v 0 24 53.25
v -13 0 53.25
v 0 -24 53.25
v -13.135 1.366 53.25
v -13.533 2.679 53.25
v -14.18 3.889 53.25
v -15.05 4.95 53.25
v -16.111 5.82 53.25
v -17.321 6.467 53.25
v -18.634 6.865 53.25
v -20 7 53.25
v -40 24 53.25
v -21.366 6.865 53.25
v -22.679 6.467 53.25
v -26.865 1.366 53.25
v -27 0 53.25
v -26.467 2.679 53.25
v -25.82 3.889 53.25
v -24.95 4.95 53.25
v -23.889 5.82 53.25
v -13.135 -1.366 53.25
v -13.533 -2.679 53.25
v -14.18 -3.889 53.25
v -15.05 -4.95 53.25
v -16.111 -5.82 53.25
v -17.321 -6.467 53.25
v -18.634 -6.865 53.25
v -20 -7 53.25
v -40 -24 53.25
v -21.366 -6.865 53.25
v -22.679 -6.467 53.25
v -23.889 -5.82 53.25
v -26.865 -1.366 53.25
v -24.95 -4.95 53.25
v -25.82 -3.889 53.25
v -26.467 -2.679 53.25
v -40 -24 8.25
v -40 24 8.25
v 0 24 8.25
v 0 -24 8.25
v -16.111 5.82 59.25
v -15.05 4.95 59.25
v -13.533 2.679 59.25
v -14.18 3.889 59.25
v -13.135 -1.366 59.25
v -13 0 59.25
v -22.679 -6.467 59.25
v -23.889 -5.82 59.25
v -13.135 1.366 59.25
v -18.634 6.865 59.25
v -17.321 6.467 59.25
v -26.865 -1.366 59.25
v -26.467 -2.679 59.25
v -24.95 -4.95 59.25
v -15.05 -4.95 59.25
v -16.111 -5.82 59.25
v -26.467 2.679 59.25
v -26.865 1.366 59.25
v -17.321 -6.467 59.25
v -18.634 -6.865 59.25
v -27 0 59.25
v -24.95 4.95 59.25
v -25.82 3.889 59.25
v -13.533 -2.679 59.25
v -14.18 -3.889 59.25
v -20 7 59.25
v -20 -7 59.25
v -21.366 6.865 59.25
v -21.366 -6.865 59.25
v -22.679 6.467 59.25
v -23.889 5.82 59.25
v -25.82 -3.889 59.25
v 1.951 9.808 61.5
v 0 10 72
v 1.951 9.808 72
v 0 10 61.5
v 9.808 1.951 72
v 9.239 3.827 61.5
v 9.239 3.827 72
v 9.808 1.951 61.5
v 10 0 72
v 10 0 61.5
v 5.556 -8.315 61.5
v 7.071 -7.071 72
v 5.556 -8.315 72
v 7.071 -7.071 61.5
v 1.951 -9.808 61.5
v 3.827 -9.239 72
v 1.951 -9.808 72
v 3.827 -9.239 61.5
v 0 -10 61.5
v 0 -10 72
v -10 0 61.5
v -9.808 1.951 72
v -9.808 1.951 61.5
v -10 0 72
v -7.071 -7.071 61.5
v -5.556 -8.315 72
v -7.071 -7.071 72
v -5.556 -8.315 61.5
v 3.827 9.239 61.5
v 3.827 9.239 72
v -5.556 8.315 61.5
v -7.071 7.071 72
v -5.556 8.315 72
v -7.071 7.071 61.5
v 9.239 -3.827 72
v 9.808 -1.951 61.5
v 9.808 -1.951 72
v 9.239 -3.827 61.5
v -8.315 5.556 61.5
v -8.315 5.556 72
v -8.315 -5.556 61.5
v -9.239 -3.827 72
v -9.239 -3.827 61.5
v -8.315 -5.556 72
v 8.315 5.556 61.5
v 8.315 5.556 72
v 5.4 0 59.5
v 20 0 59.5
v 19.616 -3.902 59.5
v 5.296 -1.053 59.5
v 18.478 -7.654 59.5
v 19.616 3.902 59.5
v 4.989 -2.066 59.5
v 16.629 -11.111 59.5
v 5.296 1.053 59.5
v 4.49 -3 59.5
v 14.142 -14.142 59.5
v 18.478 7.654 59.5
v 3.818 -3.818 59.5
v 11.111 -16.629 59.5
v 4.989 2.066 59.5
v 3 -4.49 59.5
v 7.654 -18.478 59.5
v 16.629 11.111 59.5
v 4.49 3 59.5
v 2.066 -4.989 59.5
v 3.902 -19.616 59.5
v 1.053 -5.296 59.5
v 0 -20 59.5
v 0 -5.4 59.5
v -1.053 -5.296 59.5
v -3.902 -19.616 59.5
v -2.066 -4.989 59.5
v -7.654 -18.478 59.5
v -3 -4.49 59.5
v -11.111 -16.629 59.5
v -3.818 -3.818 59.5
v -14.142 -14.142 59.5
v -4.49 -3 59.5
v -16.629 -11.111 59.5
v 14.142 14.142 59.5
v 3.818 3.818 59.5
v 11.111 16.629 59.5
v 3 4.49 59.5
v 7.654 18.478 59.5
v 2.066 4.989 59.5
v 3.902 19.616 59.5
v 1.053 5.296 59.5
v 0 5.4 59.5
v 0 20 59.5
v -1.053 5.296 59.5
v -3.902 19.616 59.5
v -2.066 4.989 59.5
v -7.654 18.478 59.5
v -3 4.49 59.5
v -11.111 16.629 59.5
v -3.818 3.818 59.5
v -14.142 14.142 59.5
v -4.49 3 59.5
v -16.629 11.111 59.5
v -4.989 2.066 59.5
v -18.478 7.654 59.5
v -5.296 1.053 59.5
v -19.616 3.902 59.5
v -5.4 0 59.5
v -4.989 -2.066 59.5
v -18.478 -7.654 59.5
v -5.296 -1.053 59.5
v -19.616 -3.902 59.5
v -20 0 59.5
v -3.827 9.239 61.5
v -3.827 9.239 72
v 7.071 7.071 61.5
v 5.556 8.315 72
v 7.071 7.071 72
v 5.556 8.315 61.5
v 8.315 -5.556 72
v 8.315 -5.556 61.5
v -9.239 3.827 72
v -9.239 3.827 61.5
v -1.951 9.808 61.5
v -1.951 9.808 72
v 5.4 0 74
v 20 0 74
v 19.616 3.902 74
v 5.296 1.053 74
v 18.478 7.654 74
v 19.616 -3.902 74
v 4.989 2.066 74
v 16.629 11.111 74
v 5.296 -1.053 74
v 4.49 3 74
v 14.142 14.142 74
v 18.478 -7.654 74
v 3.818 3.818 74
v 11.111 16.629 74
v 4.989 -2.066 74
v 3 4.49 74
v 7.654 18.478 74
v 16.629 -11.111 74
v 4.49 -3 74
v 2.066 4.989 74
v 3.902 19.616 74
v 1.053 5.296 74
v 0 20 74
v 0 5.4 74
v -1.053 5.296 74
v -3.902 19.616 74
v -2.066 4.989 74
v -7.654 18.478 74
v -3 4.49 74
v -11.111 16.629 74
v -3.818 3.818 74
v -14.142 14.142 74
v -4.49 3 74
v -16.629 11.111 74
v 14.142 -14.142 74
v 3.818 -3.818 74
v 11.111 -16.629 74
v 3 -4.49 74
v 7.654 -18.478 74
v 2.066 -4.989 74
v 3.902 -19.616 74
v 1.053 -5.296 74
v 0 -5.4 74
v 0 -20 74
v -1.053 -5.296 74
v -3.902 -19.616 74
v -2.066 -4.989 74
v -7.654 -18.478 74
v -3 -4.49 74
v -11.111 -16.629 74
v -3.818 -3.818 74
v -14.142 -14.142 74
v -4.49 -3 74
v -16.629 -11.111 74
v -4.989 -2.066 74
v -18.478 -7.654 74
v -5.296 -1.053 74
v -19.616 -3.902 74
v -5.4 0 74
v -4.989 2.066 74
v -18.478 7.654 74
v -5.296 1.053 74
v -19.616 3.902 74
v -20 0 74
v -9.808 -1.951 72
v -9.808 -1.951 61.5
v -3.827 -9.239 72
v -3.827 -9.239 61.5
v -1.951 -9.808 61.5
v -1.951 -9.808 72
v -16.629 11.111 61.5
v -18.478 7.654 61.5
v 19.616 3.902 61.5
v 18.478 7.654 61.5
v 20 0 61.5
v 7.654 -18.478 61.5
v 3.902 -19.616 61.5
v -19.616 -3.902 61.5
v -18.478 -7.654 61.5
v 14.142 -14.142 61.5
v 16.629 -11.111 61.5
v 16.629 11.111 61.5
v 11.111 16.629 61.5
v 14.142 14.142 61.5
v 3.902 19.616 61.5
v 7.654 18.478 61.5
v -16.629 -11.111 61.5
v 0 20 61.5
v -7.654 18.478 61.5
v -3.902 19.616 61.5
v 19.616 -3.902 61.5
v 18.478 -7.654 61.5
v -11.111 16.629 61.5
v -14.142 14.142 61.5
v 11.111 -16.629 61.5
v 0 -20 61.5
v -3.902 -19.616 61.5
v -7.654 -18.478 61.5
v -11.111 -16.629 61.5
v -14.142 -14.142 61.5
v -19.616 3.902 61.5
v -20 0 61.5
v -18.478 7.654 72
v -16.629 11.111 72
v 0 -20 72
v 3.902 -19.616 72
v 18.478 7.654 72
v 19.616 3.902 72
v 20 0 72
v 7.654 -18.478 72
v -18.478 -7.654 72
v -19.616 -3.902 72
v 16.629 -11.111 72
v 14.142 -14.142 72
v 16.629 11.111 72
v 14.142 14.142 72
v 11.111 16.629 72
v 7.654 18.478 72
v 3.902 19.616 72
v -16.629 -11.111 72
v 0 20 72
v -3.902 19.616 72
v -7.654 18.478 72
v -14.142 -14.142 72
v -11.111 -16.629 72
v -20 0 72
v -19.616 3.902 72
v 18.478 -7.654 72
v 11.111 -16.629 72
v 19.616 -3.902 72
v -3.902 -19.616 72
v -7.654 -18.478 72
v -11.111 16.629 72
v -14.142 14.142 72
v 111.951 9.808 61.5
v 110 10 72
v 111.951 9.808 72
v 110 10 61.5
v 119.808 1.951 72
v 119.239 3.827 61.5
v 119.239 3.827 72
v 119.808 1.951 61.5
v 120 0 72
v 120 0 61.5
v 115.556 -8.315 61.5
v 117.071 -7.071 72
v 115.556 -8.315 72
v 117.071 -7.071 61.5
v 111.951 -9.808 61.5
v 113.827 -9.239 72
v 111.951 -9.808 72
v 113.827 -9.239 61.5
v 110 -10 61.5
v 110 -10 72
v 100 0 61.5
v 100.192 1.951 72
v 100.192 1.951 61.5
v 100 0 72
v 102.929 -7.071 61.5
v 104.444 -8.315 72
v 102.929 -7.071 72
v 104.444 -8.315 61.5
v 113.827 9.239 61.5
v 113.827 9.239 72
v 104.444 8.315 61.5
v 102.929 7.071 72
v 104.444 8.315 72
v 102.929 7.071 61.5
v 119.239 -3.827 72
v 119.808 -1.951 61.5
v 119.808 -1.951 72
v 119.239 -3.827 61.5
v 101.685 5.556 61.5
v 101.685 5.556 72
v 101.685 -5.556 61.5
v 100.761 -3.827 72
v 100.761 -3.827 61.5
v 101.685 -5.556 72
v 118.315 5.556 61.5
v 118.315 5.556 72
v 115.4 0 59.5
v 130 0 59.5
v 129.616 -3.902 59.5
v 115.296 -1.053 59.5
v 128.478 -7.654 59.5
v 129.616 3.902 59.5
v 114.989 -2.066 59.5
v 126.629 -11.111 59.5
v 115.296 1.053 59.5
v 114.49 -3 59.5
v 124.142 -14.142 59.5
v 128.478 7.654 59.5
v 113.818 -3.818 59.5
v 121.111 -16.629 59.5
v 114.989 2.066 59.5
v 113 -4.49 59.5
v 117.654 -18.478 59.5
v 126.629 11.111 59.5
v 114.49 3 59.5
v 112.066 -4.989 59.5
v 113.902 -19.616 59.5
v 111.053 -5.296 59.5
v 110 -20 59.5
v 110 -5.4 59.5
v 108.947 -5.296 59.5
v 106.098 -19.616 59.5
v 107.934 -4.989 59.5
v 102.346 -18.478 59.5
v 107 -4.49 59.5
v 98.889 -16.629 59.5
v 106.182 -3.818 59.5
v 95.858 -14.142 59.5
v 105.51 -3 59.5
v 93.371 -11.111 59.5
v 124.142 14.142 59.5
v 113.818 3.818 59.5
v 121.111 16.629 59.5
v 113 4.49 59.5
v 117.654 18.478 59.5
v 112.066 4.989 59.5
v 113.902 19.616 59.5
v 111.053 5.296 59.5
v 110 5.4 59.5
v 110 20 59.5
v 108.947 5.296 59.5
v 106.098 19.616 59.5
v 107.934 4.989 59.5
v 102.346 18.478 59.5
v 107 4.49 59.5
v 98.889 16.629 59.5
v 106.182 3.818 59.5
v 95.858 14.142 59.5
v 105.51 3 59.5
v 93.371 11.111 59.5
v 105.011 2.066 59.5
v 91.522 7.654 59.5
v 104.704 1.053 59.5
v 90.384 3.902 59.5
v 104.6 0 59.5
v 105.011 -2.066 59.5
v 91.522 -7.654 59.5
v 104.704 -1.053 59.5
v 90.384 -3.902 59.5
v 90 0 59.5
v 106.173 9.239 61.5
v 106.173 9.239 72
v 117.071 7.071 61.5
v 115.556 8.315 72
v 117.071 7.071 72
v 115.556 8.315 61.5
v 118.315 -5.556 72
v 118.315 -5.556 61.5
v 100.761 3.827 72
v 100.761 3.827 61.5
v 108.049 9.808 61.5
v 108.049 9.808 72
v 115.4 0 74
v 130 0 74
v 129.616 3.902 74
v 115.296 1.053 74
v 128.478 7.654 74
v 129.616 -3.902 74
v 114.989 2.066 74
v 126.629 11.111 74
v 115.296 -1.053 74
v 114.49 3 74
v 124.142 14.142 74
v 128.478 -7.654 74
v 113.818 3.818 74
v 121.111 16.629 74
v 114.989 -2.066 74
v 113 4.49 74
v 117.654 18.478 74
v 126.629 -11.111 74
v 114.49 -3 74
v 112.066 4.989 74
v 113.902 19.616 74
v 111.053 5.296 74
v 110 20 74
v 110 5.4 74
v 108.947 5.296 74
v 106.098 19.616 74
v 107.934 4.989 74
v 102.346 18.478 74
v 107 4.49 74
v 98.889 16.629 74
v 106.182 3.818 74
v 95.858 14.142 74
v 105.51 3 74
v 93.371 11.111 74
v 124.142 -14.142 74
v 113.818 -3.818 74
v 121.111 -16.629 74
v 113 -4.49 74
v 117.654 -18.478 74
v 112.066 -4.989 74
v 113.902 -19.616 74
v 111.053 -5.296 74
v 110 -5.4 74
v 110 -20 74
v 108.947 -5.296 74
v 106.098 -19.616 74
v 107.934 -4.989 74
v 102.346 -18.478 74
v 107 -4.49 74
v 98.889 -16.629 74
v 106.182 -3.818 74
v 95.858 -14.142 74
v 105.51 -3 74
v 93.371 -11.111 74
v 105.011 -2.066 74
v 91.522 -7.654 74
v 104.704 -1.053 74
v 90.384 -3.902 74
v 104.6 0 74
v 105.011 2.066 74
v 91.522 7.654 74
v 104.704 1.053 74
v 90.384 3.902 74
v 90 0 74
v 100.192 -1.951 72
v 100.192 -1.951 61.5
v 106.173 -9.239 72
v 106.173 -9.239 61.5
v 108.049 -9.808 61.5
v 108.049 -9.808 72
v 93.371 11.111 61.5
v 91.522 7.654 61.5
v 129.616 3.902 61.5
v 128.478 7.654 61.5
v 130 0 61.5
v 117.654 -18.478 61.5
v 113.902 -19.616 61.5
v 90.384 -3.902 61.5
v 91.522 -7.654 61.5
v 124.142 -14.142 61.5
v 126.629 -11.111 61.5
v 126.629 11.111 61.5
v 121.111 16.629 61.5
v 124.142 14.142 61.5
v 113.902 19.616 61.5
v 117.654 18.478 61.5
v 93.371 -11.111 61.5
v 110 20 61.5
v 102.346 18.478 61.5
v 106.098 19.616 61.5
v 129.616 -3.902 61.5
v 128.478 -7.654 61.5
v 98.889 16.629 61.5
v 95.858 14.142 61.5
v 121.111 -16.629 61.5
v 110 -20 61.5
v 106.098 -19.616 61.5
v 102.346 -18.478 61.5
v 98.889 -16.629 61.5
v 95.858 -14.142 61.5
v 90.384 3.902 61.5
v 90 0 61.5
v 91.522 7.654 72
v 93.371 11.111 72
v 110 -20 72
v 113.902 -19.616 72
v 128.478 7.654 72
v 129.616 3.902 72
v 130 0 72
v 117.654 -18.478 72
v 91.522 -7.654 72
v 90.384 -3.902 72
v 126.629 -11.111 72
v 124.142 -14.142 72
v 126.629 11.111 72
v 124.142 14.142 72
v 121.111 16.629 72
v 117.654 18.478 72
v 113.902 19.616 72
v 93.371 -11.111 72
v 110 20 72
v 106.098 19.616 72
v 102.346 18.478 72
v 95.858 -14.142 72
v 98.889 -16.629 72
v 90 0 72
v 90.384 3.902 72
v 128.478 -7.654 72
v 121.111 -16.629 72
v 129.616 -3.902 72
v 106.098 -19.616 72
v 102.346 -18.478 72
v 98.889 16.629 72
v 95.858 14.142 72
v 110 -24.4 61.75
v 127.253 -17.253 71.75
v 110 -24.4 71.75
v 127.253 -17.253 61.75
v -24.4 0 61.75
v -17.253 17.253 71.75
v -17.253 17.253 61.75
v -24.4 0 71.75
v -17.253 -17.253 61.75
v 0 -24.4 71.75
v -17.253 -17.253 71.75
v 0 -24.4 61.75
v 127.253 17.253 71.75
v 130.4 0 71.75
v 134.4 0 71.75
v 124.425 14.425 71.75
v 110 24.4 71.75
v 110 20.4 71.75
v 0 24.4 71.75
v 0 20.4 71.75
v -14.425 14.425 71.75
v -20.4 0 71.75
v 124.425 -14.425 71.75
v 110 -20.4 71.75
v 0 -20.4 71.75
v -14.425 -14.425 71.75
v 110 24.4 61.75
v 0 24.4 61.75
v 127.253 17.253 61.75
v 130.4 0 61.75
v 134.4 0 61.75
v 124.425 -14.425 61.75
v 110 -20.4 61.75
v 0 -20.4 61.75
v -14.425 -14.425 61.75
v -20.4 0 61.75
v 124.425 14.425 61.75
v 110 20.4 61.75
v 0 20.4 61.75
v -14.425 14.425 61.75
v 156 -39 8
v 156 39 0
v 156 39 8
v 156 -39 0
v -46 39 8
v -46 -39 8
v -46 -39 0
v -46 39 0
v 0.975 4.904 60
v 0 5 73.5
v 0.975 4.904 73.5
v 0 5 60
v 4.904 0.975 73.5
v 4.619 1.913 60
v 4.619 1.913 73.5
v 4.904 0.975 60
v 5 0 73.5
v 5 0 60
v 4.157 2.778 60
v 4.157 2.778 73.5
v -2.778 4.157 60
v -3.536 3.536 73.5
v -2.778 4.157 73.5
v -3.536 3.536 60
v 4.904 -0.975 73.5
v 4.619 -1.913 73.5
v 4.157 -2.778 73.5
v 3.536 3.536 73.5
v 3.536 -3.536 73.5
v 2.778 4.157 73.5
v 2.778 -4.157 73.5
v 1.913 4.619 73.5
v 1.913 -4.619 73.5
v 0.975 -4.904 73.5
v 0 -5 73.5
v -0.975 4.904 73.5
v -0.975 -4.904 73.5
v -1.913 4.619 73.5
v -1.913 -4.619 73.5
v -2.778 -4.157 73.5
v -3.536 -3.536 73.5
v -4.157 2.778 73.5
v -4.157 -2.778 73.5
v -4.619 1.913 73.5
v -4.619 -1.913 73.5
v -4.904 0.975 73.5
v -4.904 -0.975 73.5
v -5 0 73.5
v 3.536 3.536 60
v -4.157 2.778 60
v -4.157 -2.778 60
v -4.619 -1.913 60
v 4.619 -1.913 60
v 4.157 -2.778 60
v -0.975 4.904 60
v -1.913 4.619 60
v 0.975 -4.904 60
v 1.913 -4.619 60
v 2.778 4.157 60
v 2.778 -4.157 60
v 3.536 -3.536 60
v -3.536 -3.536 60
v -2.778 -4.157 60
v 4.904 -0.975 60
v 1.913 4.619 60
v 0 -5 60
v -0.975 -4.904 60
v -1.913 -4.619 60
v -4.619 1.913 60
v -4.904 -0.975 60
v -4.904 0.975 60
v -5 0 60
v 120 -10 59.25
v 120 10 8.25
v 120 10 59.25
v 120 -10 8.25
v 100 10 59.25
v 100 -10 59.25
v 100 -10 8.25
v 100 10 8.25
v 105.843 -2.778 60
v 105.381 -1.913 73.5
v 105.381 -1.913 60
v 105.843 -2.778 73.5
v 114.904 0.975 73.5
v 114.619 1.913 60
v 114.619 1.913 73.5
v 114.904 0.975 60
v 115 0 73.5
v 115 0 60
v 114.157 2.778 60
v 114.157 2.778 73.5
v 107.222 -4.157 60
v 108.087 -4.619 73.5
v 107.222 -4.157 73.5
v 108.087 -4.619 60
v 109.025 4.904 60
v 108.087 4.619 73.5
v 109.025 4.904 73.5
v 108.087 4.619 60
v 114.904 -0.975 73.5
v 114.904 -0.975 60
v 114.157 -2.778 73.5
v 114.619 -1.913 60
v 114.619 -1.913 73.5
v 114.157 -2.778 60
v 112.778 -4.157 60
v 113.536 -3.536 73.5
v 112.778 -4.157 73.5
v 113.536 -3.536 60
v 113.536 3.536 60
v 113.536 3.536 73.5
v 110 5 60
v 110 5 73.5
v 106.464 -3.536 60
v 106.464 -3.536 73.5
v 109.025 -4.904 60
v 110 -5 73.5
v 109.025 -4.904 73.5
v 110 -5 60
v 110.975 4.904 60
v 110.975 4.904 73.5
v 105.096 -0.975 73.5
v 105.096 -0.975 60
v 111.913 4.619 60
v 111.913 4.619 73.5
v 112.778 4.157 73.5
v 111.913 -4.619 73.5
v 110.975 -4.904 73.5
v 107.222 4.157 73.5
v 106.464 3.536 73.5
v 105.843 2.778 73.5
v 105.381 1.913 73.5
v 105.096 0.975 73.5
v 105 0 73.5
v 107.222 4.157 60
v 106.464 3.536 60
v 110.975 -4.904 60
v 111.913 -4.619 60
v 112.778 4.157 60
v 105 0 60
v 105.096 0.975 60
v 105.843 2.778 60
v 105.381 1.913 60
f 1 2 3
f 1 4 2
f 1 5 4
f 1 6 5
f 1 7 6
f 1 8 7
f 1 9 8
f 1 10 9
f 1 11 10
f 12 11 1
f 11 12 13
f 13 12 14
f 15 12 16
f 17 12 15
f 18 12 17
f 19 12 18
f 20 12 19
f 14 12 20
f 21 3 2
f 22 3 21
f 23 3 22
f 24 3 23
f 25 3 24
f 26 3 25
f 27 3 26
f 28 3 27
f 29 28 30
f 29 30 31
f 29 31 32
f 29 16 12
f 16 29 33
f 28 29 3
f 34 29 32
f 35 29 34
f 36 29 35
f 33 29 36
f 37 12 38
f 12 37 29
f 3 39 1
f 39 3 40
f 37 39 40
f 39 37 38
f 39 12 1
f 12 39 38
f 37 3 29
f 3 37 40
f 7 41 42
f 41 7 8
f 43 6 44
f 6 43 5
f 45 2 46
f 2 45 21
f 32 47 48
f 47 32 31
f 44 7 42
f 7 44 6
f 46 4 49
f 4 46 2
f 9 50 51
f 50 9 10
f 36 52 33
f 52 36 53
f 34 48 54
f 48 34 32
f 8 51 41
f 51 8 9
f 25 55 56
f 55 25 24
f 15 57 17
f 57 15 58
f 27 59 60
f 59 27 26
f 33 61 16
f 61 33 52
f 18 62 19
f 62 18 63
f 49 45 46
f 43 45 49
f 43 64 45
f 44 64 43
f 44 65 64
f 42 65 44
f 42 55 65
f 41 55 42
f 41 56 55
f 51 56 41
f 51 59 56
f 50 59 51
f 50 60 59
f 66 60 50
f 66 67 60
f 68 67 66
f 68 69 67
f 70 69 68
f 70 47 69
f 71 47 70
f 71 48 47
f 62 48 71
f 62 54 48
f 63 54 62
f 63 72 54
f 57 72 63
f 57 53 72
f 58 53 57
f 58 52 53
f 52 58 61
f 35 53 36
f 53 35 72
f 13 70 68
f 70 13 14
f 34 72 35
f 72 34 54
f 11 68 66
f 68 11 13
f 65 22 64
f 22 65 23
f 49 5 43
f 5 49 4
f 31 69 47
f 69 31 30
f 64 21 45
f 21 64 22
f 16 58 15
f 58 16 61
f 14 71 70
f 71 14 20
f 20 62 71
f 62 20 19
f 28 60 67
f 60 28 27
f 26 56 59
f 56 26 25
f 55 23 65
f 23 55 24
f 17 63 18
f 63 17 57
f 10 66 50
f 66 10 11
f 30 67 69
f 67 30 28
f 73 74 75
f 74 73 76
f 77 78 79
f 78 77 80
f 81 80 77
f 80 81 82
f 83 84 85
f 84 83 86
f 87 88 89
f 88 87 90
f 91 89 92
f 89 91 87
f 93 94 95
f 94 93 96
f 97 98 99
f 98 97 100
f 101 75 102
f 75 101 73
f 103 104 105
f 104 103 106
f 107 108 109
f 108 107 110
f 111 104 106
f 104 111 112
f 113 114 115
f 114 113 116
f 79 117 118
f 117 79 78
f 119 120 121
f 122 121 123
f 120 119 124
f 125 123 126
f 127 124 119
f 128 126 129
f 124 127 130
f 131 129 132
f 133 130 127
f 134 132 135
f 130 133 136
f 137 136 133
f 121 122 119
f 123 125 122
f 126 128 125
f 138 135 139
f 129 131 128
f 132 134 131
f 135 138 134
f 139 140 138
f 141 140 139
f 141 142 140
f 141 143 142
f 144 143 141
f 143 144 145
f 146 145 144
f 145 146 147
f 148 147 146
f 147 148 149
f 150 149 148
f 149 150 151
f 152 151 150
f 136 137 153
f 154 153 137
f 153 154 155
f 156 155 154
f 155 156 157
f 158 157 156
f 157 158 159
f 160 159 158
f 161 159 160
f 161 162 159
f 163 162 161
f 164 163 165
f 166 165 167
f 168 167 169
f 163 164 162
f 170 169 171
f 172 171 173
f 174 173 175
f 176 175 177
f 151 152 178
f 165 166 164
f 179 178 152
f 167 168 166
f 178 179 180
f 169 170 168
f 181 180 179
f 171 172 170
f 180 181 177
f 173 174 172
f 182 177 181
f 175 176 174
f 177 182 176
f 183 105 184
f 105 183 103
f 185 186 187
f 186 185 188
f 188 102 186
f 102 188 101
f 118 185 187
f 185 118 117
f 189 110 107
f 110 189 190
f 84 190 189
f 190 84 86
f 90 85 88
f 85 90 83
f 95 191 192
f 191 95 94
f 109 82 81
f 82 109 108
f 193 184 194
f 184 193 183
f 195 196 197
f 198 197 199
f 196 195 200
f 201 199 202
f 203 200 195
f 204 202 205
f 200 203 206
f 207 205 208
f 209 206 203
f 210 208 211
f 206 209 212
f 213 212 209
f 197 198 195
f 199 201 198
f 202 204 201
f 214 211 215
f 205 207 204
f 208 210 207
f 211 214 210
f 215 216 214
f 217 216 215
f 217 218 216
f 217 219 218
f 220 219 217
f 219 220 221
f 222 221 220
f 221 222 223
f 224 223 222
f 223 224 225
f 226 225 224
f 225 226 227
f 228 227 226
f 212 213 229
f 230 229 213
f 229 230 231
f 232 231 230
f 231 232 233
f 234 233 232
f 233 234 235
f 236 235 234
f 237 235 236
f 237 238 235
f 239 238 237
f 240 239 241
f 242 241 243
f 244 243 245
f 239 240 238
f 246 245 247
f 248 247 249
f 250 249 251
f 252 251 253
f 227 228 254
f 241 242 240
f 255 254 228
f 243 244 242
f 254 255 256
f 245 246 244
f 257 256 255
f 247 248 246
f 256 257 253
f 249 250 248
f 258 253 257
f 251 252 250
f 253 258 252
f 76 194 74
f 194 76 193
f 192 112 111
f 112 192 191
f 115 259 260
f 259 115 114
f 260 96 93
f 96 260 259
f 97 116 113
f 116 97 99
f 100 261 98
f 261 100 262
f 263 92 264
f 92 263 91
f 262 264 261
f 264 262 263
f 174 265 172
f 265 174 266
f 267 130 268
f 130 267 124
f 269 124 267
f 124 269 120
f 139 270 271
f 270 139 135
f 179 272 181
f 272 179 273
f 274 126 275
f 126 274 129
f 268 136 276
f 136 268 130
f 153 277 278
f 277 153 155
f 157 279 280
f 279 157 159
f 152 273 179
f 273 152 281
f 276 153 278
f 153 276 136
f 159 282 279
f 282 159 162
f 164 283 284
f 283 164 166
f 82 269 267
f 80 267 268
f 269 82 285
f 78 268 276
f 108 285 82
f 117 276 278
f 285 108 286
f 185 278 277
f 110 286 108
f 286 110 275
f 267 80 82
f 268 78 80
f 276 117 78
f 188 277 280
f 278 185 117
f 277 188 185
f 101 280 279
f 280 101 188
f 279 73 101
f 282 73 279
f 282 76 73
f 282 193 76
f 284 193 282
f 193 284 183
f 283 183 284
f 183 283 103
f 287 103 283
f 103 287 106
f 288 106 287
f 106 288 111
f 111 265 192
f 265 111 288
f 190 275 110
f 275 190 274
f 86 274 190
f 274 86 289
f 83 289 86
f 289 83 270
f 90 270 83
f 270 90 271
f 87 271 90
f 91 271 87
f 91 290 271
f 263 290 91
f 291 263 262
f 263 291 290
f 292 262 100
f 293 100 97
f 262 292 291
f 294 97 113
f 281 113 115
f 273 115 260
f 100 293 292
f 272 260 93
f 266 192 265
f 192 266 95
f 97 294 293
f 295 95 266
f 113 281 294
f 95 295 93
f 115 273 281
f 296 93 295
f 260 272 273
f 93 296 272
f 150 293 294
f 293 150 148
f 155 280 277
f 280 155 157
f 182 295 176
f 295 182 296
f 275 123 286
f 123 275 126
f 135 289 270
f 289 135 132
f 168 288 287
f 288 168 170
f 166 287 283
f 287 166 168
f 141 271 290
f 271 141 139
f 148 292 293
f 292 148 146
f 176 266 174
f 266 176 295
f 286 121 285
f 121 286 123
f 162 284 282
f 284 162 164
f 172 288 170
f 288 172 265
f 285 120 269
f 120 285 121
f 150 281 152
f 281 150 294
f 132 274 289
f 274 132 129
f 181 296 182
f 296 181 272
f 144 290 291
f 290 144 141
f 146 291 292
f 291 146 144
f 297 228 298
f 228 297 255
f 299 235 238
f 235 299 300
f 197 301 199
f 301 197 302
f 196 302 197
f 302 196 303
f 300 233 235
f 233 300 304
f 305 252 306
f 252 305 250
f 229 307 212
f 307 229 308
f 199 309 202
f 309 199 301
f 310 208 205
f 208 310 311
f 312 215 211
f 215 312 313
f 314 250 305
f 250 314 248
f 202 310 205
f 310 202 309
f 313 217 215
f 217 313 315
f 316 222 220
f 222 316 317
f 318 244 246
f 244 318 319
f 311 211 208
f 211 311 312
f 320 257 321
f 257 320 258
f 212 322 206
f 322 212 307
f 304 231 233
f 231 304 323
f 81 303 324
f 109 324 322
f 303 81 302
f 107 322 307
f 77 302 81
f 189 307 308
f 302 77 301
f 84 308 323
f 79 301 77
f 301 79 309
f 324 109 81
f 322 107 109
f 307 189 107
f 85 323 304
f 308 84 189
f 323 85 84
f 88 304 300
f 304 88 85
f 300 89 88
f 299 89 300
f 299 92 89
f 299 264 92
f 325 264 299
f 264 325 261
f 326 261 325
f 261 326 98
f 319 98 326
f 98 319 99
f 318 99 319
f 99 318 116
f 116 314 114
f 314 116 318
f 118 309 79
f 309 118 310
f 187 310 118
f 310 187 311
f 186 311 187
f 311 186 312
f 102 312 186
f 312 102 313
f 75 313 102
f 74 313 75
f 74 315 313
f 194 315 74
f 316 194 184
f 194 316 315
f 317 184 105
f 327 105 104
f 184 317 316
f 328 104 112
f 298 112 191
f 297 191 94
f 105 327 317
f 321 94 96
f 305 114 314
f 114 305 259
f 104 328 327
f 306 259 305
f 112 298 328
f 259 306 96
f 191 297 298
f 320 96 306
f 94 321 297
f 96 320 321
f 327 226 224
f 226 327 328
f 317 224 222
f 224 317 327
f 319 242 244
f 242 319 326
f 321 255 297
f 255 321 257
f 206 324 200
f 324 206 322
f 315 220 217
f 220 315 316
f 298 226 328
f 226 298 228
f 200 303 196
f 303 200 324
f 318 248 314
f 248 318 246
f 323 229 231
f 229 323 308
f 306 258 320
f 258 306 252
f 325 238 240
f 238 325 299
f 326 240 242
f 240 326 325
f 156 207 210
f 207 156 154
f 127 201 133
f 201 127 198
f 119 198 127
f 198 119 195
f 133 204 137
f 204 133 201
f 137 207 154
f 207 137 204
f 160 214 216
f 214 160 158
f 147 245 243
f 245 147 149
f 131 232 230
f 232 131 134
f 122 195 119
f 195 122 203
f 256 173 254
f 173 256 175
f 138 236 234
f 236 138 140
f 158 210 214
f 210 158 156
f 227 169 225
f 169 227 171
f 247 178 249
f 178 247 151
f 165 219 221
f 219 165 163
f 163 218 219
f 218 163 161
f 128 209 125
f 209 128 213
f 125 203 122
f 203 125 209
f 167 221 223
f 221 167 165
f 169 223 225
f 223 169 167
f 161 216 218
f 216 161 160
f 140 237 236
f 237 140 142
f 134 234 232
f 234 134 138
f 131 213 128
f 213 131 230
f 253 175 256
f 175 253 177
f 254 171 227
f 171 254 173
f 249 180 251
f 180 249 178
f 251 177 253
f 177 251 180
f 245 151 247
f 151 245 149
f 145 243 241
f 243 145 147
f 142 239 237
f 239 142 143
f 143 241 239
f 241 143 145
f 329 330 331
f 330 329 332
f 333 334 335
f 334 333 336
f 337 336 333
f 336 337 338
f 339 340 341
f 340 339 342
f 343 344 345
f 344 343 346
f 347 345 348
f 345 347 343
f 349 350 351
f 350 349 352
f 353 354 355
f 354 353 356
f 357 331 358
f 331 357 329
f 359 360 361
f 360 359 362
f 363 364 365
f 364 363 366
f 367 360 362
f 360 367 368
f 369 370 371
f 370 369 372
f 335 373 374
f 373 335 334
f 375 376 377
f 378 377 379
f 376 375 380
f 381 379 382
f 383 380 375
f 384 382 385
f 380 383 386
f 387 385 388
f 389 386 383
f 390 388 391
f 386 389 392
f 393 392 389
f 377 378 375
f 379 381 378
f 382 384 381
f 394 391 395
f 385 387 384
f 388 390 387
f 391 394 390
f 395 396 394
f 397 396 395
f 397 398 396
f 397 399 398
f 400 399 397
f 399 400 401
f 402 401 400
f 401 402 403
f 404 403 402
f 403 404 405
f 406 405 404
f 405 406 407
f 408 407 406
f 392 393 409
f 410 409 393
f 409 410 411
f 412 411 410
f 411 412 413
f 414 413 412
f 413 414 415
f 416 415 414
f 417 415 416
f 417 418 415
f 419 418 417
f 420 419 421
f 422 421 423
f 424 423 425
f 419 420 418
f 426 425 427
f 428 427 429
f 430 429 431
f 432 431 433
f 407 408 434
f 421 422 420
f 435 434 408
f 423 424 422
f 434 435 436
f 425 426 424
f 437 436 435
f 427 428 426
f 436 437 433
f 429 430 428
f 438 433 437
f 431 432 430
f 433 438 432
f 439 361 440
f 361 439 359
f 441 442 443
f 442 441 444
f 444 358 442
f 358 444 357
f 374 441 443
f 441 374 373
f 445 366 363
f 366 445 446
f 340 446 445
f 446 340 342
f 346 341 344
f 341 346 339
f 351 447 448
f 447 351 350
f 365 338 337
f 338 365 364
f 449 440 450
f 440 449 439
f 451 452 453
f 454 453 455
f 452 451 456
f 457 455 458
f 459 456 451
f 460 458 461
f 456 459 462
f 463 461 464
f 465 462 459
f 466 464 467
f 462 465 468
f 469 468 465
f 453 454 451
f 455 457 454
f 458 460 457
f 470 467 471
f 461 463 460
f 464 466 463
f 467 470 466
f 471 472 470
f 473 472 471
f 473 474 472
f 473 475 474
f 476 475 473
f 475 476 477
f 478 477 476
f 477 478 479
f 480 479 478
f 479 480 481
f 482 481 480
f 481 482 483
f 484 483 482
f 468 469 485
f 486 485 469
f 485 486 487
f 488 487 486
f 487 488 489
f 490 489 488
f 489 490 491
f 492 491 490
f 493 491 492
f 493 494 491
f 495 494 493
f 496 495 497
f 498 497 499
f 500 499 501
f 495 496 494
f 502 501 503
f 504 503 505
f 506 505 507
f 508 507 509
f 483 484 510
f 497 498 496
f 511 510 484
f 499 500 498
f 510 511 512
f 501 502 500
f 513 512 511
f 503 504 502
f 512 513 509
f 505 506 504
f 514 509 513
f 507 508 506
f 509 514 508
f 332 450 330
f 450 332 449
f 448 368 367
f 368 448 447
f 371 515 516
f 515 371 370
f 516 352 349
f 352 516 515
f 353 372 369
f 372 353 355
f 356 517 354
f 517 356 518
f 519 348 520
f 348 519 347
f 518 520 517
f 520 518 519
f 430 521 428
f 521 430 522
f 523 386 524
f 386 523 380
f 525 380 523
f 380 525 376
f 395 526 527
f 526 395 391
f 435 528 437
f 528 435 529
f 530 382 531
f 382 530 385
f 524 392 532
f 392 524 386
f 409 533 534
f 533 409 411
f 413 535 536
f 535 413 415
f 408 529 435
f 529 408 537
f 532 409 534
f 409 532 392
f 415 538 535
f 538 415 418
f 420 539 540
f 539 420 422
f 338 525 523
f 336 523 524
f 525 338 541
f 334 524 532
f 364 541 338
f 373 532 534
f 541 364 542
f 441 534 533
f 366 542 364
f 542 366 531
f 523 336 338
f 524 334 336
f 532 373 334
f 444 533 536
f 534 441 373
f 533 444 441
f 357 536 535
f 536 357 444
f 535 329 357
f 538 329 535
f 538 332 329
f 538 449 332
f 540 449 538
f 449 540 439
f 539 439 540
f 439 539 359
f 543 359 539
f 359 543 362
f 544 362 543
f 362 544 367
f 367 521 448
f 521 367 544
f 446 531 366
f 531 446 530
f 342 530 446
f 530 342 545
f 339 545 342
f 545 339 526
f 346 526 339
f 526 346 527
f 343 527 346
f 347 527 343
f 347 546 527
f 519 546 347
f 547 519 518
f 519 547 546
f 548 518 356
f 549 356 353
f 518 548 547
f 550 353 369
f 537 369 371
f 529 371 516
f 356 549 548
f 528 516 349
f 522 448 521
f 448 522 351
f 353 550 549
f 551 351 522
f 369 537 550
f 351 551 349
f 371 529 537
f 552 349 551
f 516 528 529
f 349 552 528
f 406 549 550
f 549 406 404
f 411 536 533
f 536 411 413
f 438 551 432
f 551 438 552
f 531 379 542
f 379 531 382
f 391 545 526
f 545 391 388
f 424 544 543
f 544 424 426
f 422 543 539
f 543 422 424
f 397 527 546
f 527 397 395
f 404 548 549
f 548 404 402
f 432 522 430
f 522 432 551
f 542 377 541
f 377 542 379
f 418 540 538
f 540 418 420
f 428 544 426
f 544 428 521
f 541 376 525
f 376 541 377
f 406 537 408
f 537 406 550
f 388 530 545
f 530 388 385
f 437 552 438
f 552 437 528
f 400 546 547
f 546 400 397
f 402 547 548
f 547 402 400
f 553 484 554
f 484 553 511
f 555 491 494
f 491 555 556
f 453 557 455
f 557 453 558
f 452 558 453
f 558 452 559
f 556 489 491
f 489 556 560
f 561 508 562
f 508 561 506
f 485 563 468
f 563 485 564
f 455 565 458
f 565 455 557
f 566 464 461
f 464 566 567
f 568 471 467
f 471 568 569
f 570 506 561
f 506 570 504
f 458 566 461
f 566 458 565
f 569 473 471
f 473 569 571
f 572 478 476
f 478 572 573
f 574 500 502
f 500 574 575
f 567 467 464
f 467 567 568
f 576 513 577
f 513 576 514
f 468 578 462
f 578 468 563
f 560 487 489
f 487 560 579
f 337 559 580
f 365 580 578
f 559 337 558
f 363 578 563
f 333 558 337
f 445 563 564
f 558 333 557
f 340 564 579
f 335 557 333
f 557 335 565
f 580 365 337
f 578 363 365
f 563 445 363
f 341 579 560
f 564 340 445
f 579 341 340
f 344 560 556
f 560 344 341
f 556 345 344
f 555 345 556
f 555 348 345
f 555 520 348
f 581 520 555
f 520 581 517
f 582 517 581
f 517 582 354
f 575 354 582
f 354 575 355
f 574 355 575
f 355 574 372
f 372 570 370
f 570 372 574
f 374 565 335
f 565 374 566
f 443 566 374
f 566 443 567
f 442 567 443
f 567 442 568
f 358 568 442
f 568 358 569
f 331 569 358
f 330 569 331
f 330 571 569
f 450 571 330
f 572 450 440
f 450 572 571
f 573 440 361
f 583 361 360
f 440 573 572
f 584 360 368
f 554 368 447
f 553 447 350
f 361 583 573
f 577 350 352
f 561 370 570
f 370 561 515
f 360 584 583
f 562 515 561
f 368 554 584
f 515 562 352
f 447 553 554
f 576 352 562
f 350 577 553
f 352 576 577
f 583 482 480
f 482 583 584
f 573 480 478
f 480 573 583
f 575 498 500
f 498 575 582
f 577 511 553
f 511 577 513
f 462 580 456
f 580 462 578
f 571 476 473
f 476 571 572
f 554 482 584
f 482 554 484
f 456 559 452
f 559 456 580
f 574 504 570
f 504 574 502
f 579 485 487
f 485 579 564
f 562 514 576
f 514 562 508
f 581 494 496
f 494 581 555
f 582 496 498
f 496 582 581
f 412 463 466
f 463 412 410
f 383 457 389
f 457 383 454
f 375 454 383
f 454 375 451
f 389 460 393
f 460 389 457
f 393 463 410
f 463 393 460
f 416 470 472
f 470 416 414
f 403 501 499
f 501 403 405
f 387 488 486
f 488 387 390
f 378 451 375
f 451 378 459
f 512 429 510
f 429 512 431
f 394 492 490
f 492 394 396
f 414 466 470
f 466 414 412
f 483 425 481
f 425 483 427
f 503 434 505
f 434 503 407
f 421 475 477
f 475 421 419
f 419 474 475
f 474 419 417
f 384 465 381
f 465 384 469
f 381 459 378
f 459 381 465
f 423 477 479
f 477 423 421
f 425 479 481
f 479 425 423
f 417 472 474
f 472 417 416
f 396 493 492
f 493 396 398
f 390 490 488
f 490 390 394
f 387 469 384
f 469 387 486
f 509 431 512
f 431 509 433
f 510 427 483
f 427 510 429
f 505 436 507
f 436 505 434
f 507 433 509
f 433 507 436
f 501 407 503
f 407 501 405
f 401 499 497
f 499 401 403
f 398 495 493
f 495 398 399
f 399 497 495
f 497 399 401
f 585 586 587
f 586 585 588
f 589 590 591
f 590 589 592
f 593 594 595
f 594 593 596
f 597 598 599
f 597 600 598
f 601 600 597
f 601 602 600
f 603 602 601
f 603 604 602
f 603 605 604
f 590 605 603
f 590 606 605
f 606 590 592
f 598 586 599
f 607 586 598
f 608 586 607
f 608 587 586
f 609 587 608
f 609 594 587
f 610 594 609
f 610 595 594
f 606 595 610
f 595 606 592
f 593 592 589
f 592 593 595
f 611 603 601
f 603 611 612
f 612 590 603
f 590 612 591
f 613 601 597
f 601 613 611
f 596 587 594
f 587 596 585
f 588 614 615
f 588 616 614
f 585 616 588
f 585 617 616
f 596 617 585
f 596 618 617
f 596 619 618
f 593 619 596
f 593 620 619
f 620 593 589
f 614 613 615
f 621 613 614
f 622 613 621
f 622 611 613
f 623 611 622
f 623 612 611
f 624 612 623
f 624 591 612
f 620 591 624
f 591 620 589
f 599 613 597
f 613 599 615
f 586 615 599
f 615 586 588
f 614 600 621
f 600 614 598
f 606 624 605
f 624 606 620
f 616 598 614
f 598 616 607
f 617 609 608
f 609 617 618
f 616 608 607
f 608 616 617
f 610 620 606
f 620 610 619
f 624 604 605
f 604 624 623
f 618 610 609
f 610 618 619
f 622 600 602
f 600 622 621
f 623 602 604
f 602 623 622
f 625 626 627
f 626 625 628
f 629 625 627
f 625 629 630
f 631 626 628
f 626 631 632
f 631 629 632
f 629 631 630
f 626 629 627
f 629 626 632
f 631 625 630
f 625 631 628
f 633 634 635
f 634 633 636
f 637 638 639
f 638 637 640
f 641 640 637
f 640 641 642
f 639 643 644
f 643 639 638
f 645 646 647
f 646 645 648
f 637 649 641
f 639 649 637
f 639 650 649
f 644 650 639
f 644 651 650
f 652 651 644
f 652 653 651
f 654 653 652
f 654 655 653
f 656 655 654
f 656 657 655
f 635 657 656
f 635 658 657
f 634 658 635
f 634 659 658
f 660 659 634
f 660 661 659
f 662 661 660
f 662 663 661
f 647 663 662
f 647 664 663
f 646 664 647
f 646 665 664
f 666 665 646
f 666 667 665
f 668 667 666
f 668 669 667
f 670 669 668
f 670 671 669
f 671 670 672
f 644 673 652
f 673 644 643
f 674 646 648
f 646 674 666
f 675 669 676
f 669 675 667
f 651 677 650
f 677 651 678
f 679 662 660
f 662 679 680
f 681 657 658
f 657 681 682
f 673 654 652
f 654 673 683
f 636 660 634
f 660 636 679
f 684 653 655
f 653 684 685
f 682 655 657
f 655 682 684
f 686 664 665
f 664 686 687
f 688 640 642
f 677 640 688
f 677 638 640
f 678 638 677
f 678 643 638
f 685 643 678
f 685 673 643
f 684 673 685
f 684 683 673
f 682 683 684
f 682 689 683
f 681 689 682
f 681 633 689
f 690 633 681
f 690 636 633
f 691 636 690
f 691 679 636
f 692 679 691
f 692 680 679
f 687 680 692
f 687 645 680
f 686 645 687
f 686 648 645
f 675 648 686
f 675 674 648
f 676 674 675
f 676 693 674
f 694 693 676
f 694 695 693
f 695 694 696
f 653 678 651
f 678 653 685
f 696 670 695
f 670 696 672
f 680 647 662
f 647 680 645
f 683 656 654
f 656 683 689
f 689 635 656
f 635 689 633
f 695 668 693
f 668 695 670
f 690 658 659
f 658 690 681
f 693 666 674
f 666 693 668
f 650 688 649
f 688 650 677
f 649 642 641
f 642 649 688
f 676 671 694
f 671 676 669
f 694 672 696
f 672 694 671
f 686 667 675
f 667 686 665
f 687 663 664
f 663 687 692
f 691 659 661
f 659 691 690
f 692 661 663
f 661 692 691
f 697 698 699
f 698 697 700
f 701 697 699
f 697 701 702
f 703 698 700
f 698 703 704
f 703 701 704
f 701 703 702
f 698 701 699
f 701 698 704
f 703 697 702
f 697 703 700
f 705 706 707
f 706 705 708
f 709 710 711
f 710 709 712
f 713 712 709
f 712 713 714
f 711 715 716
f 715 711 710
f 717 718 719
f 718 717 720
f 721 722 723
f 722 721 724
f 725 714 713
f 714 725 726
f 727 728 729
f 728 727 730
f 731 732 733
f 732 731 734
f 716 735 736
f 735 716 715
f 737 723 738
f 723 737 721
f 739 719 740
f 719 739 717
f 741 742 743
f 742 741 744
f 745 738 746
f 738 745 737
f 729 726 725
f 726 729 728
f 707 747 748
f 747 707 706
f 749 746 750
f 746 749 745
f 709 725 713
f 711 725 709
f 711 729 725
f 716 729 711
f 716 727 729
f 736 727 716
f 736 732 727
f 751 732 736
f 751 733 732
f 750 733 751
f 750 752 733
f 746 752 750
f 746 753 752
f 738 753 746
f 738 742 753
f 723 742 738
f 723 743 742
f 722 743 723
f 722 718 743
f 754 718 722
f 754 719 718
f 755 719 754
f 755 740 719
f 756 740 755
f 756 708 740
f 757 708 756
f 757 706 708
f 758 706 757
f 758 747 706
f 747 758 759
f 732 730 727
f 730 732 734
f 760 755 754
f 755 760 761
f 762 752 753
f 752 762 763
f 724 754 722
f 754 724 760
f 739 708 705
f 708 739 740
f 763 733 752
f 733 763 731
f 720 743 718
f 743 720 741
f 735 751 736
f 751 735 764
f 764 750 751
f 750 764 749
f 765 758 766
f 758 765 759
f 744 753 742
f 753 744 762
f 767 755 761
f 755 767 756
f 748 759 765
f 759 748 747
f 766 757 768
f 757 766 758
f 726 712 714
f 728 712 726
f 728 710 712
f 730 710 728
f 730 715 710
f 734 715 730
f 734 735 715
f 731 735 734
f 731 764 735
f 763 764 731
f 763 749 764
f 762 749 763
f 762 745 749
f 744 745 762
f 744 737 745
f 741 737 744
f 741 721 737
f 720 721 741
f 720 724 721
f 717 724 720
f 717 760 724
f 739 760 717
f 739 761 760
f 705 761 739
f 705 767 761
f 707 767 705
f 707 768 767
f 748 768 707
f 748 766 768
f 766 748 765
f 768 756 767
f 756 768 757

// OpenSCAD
$fn = 32;

// ------------------------------------------------------------------------
// Motor belt drive: span 110 mm, pulleys d40, belt 10 mm wide
// Every part is its own module, assembly() places every instance.
// ------------------------------------------------------------------------

// --- part 1 ---
module base_plate() {
  difference() {
    translate([-101, -39, 0]) cube([202, 78, 8]);
  }
}

// --- part 2 ---
module motor() {
  union() {
    translate([-22.5, -24, 0]) cube([45, 48, 40]);
    translate([25.5, 0, 20]) rotate([0, 90, 0]) cylinder(h = 6, d = 14, center = true);
  }
}

// --- part 3 ---
module drive_shaft() {
  translate([0, 0, -6.75]) cylinder(h = 13.5, d = 10);
}

// --- part 4 ---
module pulley_drive() {
  difference() {
    union() {
      cylinder(h = 14.5, d = 20);
      cylinder(h = 2, d = 40);
      translate([0, 0, 12.5]) cylinder(h = 2, d = 40);
    }
    translate([0, 0, -1]) cylinder(h = 16.5, d = 10.8);
  }
}

// --- part 5 ---
module idler_post() {
  translate([-10, -10, 0]) cube([20, 20, 51]);
}

// --- part 6 ---
module driven_shaft() {
  translate([0, 0, -6.75]) cylinder(h = 13.5, d = 10);
}

// --- part 7 ---
module pulley_driven() {
  difference() {
    union() {
      cylinder(h = 14.5, d = 20);
      cylinder(h = 2, d = 40);
      translate([0, 0, 12.5]) cylinder(h = 2, d = 40);
    }
    translate([0, 0, -1]) cylinder(h = 16.5, d = 10.8);
  }
}

// --- part 8 ---
module drive_belt() {
  difference() {
    linear_extrude(height = 10) polygon(points = concat([for (a = [90 : 45 : 270]) [24.4 * cos(a), 24.4 * sin(a)]], [for (a = [270 : 45 : 450]) [110 + 24.4 * cos(a), 24.4 * sin(a)]]));
    translate([0, 0, -1]) linear_extrude(height = 12) polygon(points = concat([for (a = [90 : 45 : 270]) [20.4 * cos(a), 20.4 * sin(a)]], [for (a = [270 : 45 : 450]) [110 + 20.4 * cos(a), 20.4 * sin(a)]]));
  }
}

// --- assembly ---
module assembly() {
  color([0.80, 0.24, 0.20]) translate([55, 0, 0]) rotate([0, 0, 0]) base_plate();
  color([0.20, 0.45, 0.75]) translate([0, 0, 30.75]) rotate([0, 270, 0]) motor();
  color([0.25, 0.62, 0.32]) translate([0, 0, 66.75]) rotate([0, 0, 0]) drive_shaft();
  color([0.92, 0.70, 0.18]) translate([0, 0, 59.5]) rotate([0, 0, 0]) pulley_drive();
  color([0.58, 0.35, 0.70]) translate([110, 0, 8.25]) rotate([0, 0, 0]) idler_post();
  color([0.16, 0.66, 0.66]) translate([110, 0, 66.75]) rotate([0, 0, 0]) driven_shaft();
  color([0.85, 0.48, 0.18]) translate([110, 0, 59.5]) rotate([0, 0, 0]) pulley_driven();
  color([0.55, 0.60, 0.65]) translate([0, 0, 61.75]) rotate([0, 0, 0]) drive_belt();
}

assembly();
